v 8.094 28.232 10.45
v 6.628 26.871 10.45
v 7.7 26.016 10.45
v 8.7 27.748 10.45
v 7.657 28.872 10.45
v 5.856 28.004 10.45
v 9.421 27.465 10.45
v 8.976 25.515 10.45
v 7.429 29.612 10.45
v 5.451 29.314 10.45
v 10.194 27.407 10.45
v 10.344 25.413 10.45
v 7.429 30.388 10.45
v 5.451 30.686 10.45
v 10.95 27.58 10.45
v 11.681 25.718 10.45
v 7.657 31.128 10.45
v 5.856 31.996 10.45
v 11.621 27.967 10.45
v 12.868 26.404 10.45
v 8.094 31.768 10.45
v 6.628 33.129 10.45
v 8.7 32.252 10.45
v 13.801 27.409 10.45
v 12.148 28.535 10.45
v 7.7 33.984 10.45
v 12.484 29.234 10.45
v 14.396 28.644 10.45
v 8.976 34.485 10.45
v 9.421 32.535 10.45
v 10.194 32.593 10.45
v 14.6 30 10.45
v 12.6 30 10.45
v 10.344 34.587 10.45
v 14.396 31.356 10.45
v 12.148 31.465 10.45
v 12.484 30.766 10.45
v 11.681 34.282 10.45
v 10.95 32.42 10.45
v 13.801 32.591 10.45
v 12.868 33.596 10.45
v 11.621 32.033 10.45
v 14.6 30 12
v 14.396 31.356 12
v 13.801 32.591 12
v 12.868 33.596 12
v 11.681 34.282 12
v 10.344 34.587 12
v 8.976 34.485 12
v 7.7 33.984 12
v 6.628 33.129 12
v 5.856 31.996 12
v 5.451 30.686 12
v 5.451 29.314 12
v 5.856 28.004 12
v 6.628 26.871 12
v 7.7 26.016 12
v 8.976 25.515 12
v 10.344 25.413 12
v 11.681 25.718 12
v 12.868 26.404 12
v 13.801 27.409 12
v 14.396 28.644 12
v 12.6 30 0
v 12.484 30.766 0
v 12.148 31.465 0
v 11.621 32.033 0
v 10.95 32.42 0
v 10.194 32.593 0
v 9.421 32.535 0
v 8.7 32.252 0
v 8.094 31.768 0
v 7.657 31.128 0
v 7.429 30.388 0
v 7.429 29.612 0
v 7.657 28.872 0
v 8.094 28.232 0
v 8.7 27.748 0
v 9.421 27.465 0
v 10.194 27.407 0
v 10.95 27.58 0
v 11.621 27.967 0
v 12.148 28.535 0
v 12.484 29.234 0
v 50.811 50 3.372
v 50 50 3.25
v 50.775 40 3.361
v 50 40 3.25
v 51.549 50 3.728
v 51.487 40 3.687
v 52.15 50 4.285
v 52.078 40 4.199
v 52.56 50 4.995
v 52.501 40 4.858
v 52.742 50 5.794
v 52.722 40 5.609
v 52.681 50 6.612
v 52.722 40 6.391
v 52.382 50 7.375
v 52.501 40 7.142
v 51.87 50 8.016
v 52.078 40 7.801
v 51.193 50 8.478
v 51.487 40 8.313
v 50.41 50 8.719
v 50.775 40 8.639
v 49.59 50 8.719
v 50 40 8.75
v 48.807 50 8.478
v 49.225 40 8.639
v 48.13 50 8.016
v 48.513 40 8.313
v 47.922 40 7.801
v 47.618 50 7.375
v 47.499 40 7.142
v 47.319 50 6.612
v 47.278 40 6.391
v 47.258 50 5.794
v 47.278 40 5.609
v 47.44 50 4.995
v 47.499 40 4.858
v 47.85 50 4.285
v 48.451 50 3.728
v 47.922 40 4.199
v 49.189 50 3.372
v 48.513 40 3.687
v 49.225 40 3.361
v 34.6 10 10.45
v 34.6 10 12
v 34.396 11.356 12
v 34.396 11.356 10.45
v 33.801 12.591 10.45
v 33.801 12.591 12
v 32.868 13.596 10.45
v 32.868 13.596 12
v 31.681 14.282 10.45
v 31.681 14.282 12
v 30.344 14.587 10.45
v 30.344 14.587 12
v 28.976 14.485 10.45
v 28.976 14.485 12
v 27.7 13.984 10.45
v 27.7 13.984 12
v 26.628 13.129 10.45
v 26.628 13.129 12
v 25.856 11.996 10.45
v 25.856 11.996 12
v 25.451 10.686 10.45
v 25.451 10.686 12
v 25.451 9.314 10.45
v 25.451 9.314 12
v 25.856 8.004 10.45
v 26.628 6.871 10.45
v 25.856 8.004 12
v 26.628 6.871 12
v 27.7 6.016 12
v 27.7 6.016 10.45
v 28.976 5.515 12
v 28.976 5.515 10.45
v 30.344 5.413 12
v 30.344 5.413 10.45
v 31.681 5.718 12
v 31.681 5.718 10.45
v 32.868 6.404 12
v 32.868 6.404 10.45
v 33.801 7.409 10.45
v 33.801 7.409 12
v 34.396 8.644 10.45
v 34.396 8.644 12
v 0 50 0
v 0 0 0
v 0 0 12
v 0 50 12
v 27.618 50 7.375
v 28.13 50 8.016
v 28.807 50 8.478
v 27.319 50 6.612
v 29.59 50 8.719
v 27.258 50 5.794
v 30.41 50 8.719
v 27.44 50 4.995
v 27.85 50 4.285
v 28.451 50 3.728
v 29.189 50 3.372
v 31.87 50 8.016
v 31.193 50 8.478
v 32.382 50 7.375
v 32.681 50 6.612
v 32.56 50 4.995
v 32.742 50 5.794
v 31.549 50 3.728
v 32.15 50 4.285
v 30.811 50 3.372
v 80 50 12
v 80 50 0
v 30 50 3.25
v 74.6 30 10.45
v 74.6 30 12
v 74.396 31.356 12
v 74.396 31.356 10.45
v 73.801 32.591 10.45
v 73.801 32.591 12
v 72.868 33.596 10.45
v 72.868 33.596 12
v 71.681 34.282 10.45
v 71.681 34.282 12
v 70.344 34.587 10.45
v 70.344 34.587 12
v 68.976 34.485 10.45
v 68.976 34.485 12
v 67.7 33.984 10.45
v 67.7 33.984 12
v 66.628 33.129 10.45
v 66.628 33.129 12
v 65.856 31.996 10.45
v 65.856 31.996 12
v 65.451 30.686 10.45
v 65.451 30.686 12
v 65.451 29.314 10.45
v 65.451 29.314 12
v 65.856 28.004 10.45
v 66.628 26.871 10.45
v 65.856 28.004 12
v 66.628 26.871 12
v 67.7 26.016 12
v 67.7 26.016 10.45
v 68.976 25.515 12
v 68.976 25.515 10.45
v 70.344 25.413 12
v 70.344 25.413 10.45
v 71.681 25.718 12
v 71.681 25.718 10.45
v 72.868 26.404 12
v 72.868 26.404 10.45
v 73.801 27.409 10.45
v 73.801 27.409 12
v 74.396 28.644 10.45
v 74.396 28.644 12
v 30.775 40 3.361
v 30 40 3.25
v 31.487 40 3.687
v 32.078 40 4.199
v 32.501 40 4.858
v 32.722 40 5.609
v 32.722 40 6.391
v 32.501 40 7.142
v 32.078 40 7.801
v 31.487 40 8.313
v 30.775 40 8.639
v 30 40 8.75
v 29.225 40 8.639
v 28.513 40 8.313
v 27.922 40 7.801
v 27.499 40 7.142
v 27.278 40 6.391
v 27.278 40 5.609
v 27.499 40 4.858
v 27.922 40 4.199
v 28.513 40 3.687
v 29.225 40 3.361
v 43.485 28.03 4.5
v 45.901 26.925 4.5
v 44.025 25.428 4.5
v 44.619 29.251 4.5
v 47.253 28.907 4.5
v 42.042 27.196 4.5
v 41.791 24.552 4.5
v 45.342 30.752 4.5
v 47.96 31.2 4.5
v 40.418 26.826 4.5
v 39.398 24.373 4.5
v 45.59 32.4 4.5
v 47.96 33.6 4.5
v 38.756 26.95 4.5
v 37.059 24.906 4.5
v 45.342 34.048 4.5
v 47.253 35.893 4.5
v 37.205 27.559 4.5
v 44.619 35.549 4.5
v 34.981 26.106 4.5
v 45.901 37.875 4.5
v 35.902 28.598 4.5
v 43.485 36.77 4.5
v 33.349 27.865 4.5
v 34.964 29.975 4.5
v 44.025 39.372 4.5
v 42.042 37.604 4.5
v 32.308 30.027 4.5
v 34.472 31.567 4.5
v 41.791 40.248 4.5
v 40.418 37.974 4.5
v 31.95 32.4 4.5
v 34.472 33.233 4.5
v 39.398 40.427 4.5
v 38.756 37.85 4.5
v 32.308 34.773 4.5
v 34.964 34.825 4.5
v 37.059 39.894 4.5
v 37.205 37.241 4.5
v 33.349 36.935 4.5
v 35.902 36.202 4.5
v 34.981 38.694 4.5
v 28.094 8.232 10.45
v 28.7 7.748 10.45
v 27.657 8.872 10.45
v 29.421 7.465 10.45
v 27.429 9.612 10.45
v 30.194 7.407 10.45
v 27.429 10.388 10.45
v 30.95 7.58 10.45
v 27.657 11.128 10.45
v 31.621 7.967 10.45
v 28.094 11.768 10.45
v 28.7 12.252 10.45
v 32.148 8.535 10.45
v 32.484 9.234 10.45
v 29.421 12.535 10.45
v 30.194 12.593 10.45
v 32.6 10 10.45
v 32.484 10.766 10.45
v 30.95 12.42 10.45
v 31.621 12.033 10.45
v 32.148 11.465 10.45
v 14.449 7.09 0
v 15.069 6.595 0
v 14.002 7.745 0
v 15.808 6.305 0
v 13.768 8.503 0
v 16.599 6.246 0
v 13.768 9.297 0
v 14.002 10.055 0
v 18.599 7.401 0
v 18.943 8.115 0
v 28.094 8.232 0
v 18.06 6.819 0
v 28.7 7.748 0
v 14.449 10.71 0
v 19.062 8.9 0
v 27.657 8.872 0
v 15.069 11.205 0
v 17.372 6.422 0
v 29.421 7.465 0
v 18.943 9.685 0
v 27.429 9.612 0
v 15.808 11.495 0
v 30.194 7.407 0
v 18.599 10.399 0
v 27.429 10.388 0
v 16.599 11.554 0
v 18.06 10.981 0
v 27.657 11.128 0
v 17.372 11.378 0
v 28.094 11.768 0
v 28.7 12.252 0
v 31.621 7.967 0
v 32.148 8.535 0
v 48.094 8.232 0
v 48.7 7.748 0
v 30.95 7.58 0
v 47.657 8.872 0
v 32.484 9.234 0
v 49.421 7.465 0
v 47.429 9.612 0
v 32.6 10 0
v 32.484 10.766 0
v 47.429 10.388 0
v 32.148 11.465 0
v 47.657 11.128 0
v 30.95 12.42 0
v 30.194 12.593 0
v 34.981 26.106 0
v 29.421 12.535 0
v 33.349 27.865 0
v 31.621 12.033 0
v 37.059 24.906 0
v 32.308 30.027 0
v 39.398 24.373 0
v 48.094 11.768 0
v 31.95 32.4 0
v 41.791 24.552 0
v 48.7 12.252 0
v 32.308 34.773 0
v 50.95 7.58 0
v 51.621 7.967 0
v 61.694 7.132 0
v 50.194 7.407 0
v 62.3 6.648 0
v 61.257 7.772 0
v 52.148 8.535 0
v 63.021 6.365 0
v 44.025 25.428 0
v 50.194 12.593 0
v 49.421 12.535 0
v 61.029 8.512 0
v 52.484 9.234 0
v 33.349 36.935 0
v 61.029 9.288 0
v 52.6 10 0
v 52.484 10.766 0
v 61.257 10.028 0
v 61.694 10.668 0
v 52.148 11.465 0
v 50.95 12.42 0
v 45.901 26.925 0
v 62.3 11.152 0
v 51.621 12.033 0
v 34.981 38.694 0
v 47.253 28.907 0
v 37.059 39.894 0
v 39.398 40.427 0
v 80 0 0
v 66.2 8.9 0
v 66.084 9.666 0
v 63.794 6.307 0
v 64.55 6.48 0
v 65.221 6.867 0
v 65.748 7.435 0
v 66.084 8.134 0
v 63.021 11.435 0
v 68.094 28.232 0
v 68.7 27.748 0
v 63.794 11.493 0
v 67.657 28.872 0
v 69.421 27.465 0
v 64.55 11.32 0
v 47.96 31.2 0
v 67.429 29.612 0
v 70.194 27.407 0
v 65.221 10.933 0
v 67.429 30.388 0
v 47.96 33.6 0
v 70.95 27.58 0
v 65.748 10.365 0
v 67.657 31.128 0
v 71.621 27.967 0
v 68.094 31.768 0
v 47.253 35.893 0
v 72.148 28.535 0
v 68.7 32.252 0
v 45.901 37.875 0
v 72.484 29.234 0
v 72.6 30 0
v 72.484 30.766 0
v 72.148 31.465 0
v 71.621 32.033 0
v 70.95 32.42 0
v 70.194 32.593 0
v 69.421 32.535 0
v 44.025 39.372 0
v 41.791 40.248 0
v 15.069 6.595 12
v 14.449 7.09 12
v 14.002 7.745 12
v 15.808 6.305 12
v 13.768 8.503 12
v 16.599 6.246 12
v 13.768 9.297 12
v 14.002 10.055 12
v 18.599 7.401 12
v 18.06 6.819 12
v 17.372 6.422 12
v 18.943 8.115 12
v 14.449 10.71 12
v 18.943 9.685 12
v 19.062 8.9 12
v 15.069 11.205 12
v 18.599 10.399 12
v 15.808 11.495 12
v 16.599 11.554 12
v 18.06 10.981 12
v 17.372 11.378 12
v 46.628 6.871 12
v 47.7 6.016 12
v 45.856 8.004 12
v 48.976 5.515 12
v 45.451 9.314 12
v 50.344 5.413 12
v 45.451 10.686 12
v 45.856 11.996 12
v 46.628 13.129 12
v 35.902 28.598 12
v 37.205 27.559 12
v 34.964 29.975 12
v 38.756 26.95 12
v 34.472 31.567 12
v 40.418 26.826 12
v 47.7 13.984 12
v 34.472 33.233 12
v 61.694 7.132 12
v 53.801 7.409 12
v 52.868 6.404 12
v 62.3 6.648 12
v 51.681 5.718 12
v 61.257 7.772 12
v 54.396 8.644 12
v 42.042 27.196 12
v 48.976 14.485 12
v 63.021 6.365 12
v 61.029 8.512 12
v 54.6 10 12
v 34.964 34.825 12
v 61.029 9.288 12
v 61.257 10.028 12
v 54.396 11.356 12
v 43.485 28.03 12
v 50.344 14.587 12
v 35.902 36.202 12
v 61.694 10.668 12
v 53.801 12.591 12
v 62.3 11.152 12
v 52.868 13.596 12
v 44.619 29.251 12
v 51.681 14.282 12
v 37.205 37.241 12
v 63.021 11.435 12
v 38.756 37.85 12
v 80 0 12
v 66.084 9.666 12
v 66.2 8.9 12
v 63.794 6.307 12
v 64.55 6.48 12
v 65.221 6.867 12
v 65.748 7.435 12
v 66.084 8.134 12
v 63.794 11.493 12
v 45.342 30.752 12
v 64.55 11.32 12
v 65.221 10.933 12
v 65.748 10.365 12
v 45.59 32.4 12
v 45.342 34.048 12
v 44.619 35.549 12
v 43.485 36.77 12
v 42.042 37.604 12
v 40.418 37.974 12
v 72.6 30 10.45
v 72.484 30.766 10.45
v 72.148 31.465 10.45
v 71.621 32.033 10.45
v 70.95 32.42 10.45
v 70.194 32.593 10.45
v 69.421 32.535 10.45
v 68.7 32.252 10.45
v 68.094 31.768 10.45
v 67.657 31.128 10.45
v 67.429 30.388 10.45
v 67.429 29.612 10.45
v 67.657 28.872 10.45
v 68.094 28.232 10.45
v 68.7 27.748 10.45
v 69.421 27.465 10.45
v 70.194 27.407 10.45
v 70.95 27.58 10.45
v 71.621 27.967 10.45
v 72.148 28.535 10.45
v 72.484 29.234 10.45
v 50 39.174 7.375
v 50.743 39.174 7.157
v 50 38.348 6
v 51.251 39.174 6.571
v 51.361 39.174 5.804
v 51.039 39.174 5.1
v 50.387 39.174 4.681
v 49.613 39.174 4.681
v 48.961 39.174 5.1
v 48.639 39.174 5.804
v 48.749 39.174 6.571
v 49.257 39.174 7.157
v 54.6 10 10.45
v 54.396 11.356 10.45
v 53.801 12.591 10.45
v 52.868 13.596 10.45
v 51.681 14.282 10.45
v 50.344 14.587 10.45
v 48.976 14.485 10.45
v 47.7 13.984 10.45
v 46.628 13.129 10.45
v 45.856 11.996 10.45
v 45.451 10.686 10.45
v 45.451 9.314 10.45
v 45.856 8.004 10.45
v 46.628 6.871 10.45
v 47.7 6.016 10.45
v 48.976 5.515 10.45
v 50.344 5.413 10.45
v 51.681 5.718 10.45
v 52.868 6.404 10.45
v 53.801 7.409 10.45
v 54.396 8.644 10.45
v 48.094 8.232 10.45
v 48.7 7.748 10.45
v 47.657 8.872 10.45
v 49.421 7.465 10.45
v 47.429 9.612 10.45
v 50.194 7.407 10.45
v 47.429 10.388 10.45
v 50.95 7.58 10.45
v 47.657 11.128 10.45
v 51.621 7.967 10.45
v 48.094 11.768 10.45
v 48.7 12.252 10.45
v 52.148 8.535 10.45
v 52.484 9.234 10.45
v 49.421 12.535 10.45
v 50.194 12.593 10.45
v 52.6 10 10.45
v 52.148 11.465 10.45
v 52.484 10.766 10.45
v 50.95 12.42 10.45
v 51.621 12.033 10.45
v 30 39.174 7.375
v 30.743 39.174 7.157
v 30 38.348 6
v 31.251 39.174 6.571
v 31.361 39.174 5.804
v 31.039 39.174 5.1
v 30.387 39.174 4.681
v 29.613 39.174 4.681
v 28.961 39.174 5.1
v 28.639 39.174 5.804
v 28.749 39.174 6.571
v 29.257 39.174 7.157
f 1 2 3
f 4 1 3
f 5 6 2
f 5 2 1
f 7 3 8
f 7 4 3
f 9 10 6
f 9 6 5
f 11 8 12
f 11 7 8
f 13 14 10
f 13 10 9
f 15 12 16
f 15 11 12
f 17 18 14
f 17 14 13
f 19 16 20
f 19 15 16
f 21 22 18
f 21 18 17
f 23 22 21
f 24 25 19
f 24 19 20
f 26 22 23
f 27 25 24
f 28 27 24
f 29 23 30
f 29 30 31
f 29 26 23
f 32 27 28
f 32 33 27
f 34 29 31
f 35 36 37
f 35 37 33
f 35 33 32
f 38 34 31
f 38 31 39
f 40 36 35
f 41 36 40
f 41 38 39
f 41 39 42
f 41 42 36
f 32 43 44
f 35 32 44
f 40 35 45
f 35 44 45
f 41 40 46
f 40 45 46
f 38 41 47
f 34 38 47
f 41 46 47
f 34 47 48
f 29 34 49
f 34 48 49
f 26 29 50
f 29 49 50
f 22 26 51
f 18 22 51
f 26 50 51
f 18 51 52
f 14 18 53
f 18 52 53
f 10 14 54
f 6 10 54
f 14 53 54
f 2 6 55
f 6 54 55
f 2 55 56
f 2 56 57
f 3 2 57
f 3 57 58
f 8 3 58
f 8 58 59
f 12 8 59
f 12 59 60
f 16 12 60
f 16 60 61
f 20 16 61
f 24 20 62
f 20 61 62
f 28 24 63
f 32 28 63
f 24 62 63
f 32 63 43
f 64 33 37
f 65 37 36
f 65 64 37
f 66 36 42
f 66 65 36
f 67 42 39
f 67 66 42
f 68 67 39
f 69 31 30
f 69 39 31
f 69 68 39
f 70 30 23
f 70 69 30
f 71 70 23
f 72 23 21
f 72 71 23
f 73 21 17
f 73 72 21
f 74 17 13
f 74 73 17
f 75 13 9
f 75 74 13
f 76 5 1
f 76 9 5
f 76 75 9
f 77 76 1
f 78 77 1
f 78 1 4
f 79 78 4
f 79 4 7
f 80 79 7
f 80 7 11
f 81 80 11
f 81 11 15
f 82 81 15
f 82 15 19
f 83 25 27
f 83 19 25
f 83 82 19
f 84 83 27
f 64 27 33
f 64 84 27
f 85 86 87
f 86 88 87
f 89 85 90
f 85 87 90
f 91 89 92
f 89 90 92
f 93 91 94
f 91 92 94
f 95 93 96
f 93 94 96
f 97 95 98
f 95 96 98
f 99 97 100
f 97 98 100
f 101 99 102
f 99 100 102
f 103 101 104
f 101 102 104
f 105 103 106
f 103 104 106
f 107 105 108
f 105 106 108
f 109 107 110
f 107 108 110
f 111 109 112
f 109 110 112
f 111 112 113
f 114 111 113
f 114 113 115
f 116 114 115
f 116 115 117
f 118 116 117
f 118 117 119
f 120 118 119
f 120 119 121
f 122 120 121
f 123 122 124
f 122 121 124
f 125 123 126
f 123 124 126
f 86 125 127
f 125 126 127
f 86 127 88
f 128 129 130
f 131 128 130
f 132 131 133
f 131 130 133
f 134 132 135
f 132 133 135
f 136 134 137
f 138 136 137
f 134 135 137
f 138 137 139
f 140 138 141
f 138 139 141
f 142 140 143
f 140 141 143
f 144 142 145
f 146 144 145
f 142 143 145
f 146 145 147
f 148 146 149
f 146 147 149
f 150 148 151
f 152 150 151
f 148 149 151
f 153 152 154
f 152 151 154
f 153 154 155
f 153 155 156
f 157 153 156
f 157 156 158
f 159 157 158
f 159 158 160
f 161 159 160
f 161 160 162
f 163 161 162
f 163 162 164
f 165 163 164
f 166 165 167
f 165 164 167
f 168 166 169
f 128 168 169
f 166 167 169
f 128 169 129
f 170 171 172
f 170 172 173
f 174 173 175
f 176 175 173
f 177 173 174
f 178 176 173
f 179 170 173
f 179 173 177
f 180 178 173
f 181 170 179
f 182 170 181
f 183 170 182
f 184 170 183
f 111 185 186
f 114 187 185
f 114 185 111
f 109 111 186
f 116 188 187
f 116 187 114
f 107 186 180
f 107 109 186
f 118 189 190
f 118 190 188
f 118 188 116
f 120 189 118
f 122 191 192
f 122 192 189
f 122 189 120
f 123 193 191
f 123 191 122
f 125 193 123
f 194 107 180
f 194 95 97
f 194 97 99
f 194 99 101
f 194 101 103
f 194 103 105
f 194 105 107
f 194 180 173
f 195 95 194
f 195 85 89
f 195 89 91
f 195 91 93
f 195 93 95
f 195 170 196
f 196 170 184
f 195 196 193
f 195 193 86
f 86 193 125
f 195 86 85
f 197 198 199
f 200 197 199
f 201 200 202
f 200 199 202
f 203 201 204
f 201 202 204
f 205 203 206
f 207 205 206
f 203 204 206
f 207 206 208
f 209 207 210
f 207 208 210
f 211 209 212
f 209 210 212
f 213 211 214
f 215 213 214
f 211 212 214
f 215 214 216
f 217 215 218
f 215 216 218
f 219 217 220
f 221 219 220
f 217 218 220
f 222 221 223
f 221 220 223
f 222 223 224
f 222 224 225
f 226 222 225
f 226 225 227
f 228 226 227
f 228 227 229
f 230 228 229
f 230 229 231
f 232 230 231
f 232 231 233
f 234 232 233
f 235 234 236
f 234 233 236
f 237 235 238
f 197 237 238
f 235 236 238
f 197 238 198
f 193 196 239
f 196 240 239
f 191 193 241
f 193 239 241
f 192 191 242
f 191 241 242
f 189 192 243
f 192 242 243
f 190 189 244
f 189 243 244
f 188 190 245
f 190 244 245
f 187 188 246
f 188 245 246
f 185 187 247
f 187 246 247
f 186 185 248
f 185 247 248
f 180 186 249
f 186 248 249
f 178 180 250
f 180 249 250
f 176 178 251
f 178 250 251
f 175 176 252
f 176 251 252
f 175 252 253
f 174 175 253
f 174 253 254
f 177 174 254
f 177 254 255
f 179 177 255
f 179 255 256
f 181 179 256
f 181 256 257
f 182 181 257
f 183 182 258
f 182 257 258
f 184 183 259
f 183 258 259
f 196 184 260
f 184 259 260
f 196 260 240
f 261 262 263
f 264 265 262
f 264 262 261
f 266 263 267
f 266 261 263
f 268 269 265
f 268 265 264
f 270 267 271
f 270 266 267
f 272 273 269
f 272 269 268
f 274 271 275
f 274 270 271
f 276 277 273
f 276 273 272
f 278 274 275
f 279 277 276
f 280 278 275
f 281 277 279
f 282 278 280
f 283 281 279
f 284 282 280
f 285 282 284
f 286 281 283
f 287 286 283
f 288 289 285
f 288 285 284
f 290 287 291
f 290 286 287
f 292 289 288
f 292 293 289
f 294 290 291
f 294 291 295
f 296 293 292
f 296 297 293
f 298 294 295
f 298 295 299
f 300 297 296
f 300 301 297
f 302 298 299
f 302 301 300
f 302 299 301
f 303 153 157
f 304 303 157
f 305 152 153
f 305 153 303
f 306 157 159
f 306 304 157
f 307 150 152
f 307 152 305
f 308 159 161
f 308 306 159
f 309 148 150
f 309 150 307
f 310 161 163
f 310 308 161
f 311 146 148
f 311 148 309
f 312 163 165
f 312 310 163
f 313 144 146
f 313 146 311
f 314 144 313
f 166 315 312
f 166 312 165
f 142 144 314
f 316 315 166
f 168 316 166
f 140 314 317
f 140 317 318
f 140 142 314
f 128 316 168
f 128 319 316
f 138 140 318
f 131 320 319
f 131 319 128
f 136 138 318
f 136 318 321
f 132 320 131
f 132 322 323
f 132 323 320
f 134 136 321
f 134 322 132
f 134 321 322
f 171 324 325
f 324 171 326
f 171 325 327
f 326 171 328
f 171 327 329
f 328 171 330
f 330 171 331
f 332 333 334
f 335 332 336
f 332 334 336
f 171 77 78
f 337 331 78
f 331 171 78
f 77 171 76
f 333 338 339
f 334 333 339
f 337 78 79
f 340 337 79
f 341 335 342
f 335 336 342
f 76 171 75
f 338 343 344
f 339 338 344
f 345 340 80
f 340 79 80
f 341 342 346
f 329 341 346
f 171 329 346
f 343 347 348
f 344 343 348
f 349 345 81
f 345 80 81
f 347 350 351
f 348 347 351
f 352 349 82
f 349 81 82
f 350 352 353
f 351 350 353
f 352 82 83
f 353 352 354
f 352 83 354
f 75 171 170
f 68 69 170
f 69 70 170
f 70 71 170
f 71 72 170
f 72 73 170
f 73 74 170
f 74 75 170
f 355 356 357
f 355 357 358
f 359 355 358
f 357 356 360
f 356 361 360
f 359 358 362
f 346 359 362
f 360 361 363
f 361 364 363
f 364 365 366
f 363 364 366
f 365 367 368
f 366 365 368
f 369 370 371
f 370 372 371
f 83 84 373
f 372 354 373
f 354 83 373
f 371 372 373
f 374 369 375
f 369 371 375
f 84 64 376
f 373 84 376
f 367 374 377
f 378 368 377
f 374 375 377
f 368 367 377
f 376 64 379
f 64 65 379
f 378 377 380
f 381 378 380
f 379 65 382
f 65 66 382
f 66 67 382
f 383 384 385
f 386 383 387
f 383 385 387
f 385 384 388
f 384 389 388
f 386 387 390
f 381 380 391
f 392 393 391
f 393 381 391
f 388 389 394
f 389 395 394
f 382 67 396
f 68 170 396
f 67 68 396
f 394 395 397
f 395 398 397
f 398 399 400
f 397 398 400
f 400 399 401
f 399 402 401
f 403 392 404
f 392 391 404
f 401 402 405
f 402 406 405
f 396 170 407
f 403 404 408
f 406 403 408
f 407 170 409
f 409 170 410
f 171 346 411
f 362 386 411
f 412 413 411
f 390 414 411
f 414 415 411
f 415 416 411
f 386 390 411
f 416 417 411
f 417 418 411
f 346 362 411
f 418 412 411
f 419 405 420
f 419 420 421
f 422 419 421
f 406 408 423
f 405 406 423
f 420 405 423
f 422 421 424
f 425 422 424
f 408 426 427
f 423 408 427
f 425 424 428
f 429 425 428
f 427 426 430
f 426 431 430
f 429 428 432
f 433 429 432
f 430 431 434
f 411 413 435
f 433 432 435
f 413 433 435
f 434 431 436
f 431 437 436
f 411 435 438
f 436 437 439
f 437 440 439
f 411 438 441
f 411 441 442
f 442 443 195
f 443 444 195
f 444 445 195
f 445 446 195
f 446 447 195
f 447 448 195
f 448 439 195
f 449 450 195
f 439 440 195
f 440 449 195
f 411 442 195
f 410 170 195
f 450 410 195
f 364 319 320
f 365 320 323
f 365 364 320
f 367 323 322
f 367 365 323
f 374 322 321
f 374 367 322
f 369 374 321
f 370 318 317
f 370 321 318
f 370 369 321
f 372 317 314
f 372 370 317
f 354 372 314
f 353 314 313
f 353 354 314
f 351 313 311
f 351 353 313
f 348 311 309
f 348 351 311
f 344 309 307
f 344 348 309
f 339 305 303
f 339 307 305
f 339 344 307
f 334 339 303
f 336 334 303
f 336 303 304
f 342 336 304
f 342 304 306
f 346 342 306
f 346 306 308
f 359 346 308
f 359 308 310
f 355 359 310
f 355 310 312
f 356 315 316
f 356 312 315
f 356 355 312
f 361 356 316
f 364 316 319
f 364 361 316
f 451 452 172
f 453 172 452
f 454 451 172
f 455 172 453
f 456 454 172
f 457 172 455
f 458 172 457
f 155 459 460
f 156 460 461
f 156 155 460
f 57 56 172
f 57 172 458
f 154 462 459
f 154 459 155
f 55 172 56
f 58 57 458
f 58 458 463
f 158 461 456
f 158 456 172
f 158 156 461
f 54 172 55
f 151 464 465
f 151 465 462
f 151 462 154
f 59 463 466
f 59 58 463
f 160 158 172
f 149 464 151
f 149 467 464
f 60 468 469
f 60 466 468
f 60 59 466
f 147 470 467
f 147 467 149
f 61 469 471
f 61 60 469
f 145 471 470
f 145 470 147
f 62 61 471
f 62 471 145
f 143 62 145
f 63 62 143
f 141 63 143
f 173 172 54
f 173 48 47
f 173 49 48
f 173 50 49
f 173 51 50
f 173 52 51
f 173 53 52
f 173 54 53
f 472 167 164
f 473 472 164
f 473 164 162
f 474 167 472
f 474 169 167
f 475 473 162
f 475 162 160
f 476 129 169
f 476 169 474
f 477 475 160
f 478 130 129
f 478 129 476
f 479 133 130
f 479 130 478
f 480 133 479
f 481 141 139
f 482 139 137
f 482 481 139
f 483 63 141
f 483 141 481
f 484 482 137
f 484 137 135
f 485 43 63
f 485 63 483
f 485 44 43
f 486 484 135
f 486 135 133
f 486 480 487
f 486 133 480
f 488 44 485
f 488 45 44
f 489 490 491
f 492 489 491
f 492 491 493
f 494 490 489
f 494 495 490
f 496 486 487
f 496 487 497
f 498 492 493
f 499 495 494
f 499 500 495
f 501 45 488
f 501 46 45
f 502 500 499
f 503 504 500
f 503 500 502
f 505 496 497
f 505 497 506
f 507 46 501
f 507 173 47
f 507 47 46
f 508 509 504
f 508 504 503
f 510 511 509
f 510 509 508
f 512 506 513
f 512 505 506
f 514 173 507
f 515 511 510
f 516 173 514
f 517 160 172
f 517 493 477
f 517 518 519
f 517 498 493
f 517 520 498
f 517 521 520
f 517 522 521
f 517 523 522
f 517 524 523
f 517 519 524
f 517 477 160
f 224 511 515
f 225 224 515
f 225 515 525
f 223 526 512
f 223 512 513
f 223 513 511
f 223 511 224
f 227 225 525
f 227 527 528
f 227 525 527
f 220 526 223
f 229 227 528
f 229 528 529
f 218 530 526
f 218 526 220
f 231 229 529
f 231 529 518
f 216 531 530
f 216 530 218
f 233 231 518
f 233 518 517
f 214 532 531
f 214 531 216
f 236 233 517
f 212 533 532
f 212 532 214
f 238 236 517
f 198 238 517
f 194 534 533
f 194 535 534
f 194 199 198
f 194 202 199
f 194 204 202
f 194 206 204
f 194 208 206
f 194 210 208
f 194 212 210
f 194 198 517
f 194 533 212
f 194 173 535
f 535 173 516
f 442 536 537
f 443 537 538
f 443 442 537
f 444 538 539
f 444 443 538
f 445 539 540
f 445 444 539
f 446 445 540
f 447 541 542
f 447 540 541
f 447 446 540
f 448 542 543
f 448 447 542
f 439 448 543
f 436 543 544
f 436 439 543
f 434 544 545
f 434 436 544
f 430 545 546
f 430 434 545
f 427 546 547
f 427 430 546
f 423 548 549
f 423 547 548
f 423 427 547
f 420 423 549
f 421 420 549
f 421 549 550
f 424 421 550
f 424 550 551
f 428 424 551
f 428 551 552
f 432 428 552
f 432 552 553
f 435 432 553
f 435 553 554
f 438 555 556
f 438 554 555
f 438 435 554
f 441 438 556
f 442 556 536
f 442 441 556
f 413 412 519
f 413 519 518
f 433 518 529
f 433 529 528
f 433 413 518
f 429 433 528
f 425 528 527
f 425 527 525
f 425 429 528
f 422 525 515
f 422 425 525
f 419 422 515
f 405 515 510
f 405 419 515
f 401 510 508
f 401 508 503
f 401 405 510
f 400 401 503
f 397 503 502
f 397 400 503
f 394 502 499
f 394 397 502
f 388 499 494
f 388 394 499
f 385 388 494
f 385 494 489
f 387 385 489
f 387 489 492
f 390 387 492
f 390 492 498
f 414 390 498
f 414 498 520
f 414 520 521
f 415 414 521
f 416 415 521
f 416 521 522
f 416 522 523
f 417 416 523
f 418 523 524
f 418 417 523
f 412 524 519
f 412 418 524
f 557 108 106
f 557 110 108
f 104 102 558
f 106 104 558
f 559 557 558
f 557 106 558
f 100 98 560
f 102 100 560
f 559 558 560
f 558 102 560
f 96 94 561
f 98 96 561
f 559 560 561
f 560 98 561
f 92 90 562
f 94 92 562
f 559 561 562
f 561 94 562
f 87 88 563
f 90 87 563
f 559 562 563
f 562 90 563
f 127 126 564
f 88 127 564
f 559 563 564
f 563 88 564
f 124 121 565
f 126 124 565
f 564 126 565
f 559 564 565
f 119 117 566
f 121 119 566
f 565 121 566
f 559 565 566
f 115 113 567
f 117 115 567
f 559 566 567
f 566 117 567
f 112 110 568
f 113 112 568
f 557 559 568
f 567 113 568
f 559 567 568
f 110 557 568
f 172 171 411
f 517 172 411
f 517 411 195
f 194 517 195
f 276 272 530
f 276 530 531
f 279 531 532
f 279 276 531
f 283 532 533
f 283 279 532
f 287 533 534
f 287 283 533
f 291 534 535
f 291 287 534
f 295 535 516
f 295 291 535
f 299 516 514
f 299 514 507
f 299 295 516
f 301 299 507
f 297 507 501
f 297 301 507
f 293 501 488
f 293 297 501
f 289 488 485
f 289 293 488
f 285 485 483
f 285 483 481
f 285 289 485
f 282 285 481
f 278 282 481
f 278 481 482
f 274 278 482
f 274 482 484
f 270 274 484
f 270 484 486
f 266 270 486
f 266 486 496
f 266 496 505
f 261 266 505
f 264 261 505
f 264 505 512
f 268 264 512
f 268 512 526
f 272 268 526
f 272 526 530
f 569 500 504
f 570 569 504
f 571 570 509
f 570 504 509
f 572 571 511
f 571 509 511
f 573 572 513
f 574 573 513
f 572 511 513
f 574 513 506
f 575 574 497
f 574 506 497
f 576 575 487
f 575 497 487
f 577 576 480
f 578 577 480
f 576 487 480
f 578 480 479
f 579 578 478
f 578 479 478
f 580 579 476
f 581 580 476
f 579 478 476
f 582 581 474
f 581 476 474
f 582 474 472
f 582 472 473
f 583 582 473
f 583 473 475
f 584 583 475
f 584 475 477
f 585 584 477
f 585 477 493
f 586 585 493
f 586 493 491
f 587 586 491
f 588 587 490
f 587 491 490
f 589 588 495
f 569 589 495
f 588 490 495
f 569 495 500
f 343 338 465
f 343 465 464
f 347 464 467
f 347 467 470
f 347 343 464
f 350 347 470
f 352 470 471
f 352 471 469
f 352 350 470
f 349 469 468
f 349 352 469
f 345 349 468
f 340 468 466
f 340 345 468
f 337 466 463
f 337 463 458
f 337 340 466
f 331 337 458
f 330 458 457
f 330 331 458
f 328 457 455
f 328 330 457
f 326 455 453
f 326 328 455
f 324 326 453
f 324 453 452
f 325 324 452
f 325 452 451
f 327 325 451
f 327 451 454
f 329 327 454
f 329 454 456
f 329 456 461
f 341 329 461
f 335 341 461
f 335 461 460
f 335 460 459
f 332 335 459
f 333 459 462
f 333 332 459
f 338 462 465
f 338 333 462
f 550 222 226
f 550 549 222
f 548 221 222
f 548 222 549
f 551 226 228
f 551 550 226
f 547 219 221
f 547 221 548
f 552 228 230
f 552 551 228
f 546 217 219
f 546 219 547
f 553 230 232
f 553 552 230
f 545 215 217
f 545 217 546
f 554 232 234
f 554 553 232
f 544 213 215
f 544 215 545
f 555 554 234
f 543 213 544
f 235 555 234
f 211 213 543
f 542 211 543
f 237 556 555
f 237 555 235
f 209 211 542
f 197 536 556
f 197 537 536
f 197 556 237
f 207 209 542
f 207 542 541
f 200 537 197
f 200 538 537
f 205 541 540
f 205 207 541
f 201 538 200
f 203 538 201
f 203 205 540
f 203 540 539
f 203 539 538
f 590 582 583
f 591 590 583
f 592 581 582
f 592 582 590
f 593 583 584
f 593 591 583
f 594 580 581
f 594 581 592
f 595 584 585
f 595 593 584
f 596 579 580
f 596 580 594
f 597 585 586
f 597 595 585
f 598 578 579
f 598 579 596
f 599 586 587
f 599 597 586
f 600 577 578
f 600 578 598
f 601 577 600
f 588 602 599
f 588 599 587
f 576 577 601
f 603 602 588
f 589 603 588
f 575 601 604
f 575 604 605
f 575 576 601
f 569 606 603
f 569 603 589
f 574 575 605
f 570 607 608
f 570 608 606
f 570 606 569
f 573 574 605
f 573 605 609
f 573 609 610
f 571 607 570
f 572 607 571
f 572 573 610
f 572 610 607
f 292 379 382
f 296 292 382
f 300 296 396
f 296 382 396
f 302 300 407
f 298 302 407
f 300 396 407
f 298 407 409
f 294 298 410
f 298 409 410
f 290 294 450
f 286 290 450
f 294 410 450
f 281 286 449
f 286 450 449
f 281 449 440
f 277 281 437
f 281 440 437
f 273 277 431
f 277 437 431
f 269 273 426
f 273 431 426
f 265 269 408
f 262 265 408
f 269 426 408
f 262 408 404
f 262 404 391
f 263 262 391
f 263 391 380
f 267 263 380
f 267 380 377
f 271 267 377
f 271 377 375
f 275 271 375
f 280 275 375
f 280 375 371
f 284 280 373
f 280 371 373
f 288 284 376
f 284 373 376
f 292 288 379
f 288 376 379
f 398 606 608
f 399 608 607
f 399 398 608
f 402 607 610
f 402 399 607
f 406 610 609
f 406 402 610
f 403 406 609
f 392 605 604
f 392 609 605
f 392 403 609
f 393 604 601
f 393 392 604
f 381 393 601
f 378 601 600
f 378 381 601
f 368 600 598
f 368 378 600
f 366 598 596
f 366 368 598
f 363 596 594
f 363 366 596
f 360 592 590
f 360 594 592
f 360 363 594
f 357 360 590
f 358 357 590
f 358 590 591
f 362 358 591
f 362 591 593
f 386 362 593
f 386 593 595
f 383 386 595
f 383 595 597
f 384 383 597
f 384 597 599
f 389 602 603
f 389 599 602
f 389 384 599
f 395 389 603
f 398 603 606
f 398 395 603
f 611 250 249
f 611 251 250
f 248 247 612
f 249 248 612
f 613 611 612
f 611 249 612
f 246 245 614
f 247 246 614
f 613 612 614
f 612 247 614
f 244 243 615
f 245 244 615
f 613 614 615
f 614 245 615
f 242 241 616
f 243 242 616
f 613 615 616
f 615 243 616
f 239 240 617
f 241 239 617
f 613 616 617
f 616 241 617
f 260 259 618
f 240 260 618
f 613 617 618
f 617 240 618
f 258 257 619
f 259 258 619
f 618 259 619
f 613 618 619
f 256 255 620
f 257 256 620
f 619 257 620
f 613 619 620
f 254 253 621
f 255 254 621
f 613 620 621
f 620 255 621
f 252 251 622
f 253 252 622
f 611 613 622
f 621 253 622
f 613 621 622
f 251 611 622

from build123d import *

# Parameters (mm, degrees)
CROQUIS1_W                       = 80
CROQUIS1_H                       = 50
CROQUIS1_R                       = 2.6
CROQUIS1_R_2                     = 5.59
CROQUIS1_R_3                     = 2.661703711
SALIENTE_EXTRUIR1_DEPTH          = 12
CROQUIS2_R                       = 4.6
CORTAR_EXTRUIR1_DEPTH            = 1.55
CROQUIS4_R                       = 8.05
CORTAR_EXTRUIR2_DEPTH            = 4.5
TALADRO_DE_MARGEN_PARA_M51_D     = 5.5
TALADRO_DE_MARGEN_PARA_M51_DEPTH = 10
TALADRO_DE_MARGEN_PARA_M51_TIP   = 1.652366702
TALADRO_DE_MARGEN_PARA_M52_D     = 5.5
TALADRO_DE_MARGEN_PARA_M52_DEPTH = 10
TALADRO_DE_MARGEN_PARA_M52_TIP   = 1.652366702


with BuildPart() as part:
    # Croquis1 → Saliente-Extruir1 (new body)
    with BuildSketch(Plane.XY):
        with Locations((40, 25)):
            Rectangle(CROQUIS1_W, CROQUIS1_H)
        with Locations((10, 30)):
            Circle(CROQUIS1_R, mode=Mode.SUBTRACT)
        with Locations((70, 30)):
            Circle(CROQUIS1_R, mode=Mode.SUBTRACT)
        with Locations((40, 32.4)):
            Circle(CROQUIS1_R_2, mode=Mode.SUBTRACT)
        with Locations((16.4, 8.9)):
            Circle(CROQUIS1_R_3, mode=Mode.SUBTRACT)
        with Locations((30, 10)):
            Circle(CROQUIS1_R, mode=Mode.SUBTRACT)
        with Locations((50, 10)):
            Circle(CROQUIS1_R, mode=Mode.SUBTRACT)
        with Locations((63.6, 8.9)):
            Circle(CROQUIS1_R, mode=Mode.SUBTRACT)
    extrude(amount=SALIENTE_EXTRUIR1_DEPTH)

    # Croquis2 → Cortar-Extruir1 (cut)
    with BuildSketch(Plane.XY.offset(12)):
        with Locations((10, 30)):
            Circle(CROQUIS2_R)
        with Locations((70, 30)):
            Circle(CROQUIS2_R)
        with Locations((30, 10)):
            Circle(CROQUIS2_R)
        with Locations((50, 10)):
            Circle(CROQUIS2_R)
    extrude(amount=-CORTAR_EXTRUIR1_DEPTH, mode=Mode.SUBTRACT)

    # Croquis4 → Cortar-Extruir2 (cut)
    with BuildSketch(Plane(origin=(0, 0, 0), x_dir=(-1, 0, 0), z_dir=(0, 0, -1))):
        with Locations((-40, 32.4)):
            Circle(CROQUIS4_R)
    extrude(amount=-CORTAR_EXTRUIR2_DEPTH, mode=Mode.SUBTRACT)

    # Taladro de margen para M51
    with Locations(Plane(origin=(30, 50, 6), x_dir=(0, 0, 1), z_dir=(0, 1, 0))):
        with Locations((0, 0)):
            Hole(TALADRO_DE_MARGEN_PARA_M51_D / 2, depth=TALADRO_DE_MARGEN_PARA_M51_DEPTH)
            with Locations((0, 0, -(TALADRO_DE_MARGEN_PARA_M51_DEPTH + TALADRO_DE_MARGEN_PARA_M51_TIP / 2))):  # 118° drill point
                Cone(0, TALADRO_DE_MARGEN_PARA_M51_D / 2, TALADRO_DE_MARGEN_PARA_M51_TIP, mode=Mode.SUBTRACT)

    # Taladro de margen para M52
    with Locations(Plane(origin=(50, 50, 6), x_dir=(0, 0, 1), z_dir=(0, 1, 0))):
        with Locations((0, 0)):
            Hole(TALADRO_DE_MARGEN_PARA_M52_D / 2, depth=TALADRO_DE_MARGEN_PARA_M52_DEPTH)
            with Locations((0, 0, -(TALADRO_DE_MARGEN_PARA_M52_DEPTH + TALADRO_DE_MARGEN_PARA_M52_TIP / 2))):  # 118° drill point
                Cone(0, TALADRO_DE_MARGEN_PARA_M52_D / 2, TALADRO_DE_MARGEN_PARA_M52_TIP, mode=Mode.SUBTRACT)


solid = part.part
